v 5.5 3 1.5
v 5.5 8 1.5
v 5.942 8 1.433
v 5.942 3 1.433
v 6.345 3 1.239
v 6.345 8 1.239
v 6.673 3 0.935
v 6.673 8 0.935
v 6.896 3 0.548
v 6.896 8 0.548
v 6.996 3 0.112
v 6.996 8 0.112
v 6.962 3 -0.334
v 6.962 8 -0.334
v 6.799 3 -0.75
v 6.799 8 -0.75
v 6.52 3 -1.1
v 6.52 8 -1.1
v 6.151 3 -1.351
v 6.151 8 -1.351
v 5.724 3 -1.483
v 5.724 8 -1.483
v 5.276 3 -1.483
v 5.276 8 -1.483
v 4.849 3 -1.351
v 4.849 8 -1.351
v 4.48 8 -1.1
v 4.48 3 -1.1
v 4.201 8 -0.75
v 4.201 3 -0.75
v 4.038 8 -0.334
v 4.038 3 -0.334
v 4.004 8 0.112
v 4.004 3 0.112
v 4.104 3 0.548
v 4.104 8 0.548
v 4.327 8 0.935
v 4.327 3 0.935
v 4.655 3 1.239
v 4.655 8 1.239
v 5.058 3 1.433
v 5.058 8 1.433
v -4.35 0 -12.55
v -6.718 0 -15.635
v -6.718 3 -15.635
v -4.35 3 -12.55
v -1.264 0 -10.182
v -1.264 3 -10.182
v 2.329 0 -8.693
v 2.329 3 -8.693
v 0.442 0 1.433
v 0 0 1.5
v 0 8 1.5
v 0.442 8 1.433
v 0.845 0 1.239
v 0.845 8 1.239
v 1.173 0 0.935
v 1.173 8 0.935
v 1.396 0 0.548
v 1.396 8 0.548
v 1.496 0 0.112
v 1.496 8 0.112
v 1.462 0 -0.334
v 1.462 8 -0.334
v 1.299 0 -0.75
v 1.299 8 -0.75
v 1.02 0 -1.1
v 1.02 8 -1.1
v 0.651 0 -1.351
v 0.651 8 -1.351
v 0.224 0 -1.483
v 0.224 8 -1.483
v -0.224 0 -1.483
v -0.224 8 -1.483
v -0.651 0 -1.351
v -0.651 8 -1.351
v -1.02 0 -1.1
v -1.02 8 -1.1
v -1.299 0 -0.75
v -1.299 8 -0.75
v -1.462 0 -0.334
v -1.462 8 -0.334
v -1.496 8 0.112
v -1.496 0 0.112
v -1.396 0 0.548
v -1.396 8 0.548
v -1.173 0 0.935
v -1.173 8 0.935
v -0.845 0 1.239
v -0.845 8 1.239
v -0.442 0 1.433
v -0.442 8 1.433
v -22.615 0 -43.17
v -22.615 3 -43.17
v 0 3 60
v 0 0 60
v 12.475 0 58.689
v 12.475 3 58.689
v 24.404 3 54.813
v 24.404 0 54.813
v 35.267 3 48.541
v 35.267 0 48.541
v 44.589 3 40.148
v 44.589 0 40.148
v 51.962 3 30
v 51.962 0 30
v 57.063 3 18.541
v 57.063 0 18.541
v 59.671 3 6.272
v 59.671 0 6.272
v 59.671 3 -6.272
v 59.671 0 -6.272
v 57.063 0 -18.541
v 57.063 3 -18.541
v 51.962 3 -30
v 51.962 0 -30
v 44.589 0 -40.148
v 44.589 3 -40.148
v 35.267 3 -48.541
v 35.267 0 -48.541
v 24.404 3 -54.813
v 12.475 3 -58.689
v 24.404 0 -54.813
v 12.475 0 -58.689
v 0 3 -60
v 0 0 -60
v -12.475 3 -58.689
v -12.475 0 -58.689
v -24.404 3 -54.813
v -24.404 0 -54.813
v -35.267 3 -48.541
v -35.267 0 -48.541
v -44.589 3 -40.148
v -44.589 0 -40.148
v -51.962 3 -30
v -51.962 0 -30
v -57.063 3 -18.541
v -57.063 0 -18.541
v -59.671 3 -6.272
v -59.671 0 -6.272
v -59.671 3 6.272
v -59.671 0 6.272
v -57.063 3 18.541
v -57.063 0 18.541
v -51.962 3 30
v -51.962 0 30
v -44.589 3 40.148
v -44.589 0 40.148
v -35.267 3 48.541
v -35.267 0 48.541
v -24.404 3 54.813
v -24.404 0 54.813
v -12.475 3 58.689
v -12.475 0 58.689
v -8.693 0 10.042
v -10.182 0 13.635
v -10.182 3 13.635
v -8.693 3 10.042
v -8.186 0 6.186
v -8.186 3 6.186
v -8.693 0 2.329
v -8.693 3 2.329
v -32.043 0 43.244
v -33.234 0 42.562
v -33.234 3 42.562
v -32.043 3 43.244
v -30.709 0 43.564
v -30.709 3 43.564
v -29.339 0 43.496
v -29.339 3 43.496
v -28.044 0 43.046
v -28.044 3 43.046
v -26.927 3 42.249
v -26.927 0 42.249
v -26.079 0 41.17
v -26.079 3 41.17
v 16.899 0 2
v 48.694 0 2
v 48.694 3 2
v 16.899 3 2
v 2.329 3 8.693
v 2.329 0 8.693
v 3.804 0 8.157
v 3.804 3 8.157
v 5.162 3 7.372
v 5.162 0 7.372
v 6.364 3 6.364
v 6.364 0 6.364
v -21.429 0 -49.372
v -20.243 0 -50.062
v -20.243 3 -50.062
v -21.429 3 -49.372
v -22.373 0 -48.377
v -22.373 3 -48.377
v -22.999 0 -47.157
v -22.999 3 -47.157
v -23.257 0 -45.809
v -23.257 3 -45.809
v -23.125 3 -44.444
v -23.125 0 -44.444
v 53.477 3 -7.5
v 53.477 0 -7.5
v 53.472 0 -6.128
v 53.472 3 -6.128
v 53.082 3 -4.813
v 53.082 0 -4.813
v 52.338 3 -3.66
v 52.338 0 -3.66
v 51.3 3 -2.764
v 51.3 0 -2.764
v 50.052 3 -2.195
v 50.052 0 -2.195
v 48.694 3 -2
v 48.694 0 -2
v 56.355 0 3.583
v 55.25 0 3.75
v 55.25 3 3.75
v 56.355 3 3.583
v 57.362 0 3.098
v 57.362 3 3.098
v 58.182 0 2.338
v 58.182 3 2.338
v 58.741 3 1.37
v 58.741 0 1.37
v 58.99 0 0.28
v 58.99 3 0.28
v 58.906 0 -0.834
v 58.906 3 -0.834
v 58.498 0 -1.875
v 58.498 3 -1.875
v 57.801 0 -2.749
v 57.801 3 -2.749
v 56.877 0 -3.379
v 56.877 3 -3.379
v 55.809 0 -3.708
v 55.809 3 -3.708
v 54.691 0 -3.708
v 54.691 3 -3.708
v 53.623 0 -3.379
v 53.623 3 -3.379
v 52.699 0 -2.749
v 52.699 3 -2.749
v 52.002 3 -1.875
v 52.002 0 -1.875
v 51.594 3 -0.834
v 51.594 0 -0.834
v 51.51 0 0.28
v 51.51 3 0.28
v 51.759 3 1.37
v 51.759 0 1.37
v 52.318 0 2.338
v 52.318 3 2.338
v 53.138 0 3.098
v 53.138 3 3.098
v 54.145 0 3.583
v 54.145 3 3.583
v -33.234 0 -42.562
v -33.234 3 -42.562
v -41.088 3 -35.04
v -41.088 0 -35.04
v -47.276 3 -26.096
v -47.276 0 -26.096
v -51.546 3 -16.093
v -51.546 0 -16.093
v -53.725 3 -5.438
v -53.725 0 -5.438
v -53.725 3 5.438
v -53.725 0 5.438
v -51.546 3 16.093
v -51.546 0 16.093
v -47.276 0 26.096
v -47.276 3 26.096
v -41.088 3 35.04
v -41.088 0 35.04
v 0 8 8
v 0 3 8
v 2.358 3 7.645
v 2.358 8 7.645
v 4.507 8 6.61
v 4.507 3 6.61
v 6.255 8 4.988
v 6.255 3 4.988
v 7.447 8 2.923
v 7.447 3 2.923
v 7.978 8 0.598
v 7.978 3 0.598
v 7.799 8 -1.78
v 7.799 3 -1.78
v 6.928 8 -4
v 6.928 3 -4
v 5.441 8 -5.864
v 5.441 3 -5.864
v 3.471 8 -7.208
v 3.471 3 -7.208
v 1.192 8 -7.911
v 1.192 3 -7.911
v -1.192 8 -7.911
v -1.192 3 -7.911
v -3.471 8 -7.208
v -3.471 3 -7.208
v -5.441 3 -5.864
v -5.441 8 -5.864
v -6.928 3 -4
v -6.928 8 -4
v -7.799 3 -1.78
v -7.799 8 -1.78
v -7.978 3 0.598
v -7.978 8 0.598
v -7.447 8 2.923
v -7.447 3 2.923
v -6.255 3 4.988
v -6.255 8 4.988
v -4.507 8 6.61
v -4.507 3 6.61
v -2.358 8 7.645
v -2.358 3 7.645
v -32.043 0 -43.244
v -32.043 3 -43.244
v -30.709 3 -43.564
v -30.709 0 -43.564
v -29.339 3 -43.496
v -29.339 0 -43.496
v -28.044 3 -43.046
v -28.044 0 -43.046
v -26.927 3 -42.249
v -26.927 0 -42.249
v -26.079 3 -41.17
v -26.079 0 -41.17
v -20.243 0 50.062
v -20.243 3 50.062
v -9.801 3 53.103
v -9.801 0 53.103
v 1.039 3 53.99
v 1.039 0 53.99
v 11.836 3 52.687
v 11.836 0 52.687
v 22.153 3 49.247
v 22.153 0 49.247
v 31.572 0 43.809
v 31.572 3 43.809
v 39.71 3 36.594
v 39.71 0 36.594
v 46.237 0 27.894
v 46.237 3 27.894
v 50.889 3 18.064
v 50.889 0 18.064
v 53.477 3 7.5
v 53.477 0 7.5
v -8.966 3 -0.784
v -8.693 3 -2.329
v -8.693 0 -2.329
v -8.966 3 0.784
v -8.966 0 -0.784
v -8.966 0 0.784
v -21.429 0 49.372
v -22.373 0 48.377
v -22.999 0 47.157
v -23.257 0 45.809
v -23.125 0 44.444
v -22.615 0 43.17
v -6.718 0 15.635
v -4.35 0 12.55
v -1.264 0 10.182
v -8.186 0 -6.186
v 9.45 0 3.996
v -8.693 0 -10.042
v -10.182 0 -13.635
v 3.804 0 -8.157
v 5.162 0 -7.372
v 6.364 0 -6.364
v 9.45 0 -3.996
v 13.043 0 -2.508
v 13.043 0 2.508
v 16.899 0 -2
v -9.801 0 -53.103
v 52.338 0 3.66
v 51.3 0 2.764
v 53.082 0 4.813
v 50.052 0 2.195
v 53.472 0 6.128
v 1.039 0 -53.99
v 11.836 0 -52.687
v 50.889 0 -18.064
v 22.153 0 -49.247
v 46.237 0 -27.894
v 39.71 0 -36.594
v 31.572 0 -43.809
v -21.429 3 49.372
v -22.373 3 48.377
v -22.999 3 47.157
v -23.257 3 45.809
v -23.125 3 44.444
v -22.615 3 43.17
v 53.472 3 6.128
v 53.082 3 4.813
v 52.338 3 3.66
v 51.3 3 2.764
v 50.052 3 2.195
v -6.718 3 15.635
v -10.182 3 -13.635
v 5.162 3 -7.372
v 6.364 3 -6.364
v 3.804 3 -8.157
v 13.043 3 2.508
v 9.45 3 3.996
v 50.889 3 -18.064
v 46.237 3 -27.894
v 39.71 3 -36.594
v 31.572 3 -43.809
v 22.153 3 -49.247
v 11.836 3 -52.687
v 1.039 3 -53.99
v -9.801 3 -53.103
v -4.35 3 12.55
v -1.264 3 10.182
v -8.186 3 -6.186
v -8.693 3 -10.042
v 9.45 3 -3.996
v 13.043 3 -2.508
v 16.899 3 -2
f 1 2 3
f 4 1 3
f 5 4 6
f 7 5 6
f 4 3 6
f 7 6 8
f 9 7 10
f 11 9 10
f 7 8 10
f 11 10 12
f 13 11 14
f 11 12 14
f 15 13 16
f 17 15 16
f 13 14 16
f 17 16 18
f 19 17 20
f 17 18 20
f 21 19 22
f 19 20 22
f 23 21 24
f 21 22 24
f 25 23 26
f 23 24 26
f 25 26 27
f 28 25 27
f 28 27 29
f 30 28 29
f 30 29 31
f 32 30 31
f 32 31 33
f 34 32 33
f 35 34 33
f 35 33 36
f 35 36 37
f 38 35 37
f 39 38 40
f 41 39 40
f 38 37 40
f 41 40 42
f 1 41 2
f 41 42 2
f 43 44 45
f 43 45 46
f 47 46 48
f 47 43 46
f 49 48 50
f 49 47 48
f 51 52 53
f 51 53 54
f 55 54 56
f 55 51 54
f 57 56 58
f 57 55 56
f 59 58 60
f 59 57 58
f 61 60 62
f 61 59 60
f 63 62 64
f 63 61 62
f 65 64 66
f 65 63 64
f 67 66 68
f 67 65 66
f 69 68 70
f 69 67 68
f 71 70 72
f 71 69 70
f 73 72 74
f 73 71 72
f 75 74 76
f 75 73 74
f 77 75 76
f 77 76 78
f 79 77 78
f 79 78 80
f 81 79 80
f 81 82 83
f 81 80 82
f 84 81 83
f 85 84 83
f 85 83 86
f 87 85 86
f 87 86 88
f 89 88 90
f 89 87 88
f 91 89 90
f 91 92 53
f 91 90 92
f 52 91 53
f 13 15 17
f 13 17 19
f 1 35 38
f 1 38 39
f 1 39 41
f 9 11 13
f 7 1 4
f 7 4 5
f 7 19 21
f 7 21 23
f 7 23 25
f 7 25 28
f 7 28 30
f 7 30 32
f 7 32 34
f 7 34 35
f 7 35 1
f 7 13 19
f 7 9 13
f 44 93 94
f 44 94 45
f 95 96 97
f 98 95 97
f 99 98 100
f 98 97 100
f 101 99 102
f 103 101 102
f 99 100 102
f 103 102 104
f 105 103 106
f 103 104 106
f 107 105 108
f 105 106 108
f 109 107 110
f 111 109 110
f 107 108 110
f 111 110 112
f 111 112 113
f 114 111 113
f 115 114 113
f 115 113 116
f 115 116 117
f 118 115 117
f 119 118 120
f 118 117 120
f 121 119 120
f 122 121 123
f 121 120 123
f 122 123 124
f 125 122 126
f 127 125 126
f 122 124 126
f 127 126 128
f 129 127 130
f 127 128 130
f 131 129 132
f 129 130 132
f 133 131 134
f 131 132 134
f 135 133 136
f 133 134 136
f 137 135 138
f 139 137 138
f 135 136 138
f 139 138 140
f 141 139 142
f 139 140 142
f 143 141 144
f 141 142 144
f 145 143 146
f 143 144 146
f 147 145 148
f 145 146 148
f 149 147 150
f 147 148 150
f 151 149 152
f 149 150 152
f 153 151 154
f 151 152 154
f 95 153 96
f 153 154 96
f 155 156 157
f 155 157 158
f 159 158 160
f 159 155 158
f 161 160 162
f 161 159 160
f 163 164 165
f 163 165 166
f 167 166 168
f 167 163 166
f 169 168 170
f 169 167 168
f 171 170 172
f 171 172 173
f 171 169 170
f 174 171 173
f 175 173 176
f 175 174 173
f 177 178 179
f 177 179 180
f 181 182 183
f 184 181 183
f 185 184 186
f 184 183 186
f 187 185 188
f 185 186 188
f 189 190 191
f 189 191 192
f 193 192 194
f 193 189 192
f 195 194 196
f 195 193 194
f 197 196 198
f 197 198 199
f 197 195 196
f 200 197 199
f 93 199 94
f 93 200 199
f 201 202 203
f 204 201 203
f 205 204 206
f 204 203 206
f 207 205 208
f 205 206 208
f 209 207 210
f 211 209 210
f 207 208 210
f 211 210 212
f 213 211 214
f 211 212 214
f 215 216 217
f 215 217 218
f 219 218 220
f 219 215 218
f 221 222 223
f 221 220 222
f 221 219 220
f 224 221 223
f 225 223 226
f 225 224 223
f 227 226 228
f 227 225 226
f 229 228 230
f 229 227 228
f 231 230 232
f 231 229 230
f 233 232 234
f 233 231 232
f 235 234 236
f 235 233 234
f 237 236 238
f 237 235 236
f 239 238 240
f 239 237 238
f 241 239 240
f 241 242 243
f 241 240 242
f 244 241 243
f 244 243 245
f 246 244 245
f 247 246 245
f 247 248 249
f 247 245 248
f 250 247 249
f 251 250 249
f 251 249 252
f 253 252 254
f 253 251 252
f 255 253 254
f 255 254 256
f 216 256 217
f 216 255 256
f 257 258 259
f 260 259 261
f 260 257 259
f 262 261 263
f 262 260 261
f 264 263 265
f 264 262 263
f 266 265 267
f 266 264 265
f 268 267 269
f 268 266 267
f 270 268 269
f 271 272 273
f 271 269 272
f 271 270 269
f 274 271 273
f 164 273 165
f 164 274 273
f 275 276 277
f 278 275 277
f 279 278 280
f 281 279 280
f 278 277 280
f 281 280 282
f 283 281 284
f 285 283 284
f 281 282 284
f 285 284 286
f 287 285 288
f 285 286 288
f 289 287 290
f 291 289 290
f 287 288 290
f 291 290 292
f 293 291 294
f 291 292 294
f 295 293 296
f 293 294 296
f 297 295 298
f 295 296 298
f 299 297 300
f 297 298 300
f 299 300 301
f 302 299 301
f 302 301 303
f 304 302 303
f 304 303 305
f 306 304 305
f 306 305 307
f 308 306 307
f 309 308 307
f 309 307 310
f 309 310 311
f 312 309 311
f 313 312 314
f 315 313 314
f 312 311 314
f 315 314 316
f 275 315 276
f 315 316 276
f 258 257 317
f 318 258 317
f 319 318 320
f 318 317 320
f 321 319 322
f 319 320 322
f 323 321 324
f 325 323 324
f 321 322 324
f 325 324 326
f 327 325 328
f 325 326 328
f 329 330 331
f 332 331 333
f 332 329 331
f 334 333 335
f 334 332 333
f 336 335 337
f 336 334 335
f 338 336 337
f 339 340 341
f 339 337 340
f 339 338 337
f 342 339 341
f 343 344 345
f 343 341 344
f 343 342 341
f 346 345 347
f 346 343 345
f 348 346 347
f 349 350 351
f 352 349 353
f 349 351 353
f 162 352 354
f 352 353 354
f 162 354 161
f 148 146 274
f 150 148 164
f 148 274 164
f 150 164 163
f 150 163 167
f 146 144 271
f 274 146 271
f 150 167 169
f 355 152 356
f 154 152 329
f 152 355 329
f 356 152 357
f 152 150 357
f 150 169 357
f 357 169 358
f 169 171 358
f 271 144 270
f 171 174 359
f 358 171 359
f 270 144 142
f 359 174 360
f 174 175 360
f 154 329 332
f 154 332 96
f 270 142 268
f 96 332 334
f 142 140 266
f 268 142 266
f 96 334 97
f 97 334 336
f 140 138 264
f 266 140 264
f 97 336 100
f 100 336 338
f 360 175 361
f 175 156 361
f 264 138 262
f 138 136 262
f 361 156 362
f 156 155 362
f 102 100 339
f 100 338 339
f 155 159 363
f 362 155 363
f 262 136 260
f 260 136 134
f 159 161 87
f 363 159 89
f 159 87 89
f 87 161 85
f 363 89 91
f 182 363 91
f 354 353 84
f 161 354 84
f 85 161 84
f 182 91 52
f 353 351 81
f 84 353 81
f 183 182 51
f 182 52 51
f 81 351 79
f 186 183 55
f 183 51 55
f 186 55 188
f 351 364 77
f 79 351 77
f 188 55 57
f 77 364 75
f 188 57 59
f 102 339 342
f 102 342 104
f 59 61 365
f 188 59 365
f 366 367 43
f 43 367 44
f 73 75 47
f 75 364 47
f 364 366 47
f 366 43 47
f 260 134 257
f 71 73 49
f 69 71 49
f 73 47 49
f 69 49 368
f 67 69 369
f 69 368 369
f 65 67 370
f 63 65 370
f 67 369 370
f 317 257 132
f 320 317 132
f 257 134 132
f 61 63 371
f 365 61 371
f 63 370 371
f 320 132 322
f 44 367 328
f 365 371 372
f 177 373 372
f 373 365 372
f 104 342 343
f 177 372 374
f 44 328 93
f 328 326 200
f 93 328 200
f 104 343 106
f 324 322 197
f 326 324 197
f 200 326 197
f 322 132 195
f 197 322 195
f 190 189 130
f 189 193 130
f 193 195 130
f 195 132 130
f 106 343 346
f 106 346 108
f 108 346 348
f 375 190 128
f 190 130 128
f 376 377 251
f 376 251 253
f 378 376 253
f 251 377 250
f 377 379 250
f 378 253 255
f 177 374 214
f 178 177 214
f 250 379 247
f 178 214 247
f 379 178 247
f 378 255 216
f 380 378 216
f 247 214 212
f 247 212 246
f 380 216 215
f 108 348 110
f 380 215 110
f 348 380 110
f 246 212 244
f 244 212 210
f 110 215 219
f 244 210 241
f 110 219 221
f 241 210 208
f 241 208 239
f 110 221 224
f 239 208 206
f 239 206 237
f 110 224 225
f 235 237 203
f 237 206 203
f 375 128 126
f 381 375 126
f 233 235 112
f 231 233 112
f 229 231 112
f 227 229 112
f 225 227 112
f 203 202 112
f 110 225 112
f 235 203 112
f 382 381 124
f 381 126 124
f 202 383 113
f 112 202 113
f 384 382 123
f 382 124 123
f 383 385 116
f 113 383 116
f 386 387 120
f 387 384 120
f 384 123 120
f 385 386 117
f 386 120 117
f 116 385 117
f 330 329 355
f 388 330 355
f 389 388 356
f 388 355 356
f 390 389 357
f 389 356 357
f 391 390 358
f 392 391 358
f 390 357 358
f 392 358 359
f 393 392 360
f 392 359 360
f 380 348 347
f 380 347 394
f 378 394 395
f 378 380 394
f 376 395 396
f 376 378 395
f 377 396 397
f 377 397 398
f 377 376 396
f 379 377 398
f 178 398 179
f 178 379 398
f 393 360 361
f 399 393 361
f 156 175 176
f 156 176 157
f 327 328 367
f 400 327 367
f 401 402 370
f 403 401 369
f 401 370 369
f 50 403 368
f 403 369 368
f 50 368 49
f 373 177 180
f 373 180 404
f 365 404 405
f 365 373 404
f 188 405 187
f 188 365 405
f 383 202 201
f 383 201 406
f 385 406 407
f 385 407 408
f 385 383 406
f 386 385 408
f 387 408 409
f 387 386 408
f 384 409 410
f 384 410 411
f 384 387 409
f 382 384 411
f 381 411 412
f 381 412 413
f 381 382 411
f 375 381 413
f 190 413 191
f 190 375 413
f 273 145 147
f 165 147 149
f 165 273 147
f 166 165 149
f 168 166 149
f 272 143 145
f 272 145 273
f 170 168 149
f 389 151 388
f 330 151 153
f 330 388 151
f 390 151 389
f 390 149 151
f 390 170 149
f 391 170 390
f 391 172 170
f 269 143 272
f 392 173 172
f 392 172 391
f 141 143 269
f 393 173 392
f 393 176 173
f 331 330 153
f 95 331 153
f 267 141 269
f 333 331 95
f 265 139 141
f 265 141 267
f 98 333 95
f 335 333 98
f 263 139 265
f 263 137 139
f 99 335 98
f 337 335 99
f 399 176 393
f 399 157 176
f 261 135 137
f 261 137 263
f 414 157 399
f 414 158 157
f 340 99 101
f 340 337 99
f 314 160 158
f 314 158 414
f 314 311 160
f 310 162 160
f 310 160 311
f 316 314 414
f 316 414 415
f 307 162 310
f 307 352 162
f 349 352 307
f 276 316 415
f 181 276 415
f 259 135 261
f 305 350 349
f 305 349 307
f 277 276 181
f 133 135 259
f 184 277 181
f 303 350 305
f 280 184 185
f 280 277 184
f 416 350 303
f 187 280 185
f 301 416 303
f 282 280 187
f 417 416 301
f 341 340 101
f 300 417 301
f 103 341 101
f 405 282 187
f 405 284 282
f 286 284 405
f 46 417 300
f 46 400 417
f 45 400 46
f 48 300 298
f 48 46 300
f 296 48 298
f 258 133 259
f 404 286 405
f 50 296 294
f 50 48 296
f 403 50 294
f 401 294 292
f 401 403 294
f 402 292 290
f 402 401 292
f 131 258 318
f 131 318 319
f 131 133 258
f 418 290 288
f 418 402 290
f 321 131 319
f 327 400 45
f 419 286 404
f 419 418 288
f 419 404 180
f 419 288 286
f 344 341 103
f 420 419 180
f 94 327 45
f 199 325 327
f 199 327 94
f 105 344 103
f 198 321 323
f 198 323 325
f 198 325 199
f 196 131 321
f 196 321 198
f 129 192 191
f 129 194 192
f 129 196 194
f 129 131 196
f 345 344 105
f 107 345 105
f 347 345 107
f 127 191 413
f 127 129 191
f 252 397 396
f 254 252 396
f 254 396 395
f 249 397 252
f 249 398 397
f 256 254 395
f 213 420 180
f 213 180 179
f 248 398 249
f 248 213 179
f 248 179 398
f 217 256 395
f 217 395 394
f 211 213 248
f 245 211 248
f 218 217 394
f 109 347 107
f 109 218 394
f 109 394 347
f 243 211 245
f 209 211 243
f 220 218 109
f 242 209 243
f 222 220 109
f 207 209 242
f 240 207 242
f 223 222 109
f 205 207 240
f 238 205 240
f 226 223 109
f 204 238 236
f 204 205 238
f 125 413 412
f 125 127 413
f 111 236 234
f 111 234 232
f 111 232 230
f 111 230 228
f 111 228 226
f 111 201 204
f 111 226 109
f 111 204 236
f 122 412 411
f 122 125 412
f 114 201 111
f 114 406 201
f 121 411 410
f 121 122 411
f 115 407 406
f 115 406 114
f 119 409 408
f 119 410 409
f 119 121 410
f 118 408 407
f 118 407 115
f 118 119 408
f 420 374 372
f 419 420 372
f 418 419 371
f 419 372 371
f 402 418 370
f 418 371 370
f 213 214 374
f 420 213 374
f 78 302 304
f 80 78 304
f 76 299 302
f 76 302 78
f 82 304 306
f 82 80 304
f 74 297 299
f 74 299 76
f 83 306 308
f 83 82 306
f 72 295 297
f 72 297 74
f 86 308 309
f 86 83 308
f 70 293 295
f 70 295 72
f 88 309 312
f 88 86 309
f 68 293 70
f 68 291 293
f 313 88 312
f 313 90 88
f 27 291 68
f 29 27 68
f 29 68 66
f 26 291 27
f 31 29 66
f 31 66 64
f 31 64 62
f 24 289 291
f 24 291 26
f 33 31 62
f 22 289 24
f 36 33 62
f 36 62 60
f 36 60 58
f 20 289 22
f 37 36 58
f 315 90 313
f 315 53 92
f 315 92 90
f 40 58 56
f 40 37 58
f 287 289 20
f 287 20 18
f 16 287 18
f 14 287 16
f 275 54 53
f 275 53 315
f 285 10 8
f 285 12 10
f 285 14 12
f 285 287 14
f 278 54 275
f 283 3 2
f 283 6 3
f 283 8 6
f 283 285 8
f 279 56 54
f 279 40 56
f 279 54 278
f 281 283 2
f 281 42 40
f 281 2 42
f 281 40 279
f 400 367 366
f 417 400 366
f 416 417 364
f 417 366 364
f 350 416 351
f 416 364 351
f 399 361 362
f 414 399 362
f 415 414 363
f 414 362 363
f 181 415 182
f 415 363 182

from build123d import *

# Parameters (mm, degrees)
SKETCH1_R               = 60
SKETCH1_R_2             = 54
BOSS_EXTRUDE1_DEPTH     = 3
SKETCH2_R               = 9
BOSS_EXTRUDE2_DEPTH     = 3
SKETCH3_R               = 8
BOSS_EXTRUDE3_DEPTH     = 5
BOSS_EXTRUDE4_DEPTH     = 3
CIRPATTERN9_COUNT       = 3
MIRROR2_COPY_1_DEPTH    = 3
MIRROR2_COPY_2_DEPTH    = 3
SKETCH5_R               = 1.5
CUT_EXTRUDE1_DEPTH      = 5
CUT_EXTRUDE2_DEPTH      = 86.229103011
CUT_EXTRUDE2_DEPTH_BACK = 86.229103011
SKETCH6_R               = 1.5
CUT_EXTRUDE3_DEPTH      = 86
CUT_EXTRUDE3_DEPTH_BACK = 86
SKETCH7_R               = 3.75


with BuildPart() as part:
    # Sketch1 → Boss-Extrude1 (new body)
    with BuildSketch(Plane(origin=(0, 0, 0), x_dir=(1, 0, 0), z_dir=(0, 1, 0))):
        with Locations(Location((0, 0, 0), (0, 0, 270))):
            Circle(SKETCH1_R)
        with Locations(Location((0, 0, 0), (0, 0, 270))):
            Circle(SKETCH1_R_2, mode=Mode.SUBTRACT)
    extrude(amount=BOSS_EXTRUDE1_DEPTH)



with BuildPart() as body_2:
    # Sketch2 → Boss-Extrude2 (new body)
    with BuildSketch(Plane(origin=(0, 0, 0), x_dir=(1, 0, 0), z_dir=(0, 1, 0))):
        with Locations(Location((0, 0, 0), (0, 0, 270))):
            Circle(SKETCH2_R)
    extrude(amount=BOSS_EXTRUDE2_DEPTH)

    # Sketch3 → Boss-Extrude3 (add)
    with BuildSketch(Plane(origin=(0, 3, 0), x_dir=(1, 0, 0), z_dir=(0, 1, 0))):
        with Locations(Location((0, 0, 0), (0, 0, 270))):
            Circle(SKETCH3_R)
    extrude(amount=BOSS_EXTRUDE3_DEPTH)


with BuildPart() as part_1:
    add(part.part)

    add(body_2.part)  # Boss-Extrude4 merges body 2
    # Sketch4 → Boss-Extrude4 (add)
    with BuildSketch(Plane(origin=(0, 0, 0), x_dir=(1, 0, 0), z_dir=(0, 1, 0))):
        with BuildLine():
            Line((9, 0), (54, 0))
            ThreePointArc((54, 0), (53.868998701, -3.759119436), (53.47663041, -7.5))
            ThreePointArc((53.47663041, -7.5), (52.338407888, -3.660460246), (48.694167528, -2))
            Line((48.694167528, -2), (16.899494937, -2))
            ThreePointArc((16.899494937, -2), (11.197705074, -3.13415652), (6.363961031, -6.363961031))
            ThreePointArc((6.363961031, -6.363961031), (8.314915793, -3.444150891), (9, 0))
        make_face()
    boss_extrude4 = extrude(amount=BOSS_EXTRUDE4_DEPTH)

    # CirPattern9: Boss-Extrude4 ×3 about axis
    cirpattern9_axis = Axis((0, 0, 0), (0, 1, 0))
    for i in range(1, CIRPATTERN9_COUNT):
        add(boss_extrude4.rotate(cirpattern9_axis, i * 360 / CIRPATTERN9_COUNT))

    # Mirror2: Boss-Extrude4 across plane
    add(boss_extrude4.mirror(Plane(origin=(-4.5, 54.446930959, -7.794228634), x_dir=(0.5000000000000041, 0, 0.8660254037844362), z_dir=(0.8660254037844364, 0, -0.5000000000000041))))

    # Mirror2 copy 1 sketch → Mirror2 copy 1 (add)
    with BuildSketch(Plane(origin=(0, 0, 0), x_dir=(-0.5000000000000082, 0, -0.8660254037844338), z_dir=(0, 1, 0))):
        with BuildLine():
            Line((9, 0), (54, 0))
            ThreePointArc((54, 0), (53.868998701, 3.759119436), (53.47663041, 7.5))
            ThreePointArc((53.47663041, 7.5), (52.338407888, 3.660460246), (48.694167528, 2))
            Line((48.694167528, 2), (16.899494937, 2))
            ThreePointArc((16.899494937, 2), (11.197705074, 3.13415652), (6.363961031, 6.363961031))
            ThreePointArc((6.363961031, 6.363961031), (8.314915793, 3.444150891), (9, 0))
        make_face()
    extrude(amount=MIRROR2_COPY_1_DEPTH)

    # Mirror2 copy 2 sketch → Mirror2 copy 2 (add)
    with BuildSketch(Plane(origin=(0, 0, 0), x_dir=(1, 0, 0), z_dir=(0, 1, 0))):
        with BuildLine():
            Line((9, 0), (54, 0))
            ThreePointArc((54, 0), (53.868998701, 3.759119436), (53.47663041, 7.5))
            ThreePointArc((53.47663041, 7.5), (52.338407888, 3.660460246), (48.694167528, 2))
            Line((48.694167528, 2), (16.899494937, 2))
            ThreePointArc((16.899494937, 2), (11.197705074, 3.13415652), (6.363961031, 6.363961031))
            ThreePointArc((6.363961031, 6.363961031), (8.314915793, 3.444150891), (9, 0))
        make_face()
    extrude(amount=MIRROR2_COPY_2_DEPTH)

    # Sketch5 → Cut-Extrude1 (cut)
    with BuildSketch(Plane(origin=(0, 8, 0), x_dir=(1, 0, 0), z_dir=(0, 1, 0))):
        with Locations(Location((5.5, 0, 0), (0, 0, 270))):
            Circle(SKETCH5_R)
    extrude(amount=-CUT_EXTRUDE1_DEPTH, mode=Mode.SUBTRACT)

    # Sketch6 → Cut-Extrude2 (cut, two sides: drawn at the far end of the back side and taken through both)
    with BuildSketch(Plane(origin=(0, 8, 0), x_dir=(1, 0, 0), z_dir=(0, 1, 0)).offset(-CUT_EXTRUDE2_DEPTH_BACK)):
        with Locations(Location((0, 0, 0), (0, 0, 270))):
            Circle(SKETCH6_R)
    extrude(amount=CUT_EXTRUDE2_DEPTH + CUT_EXTRUDE2_DEPTH_BACK, mode=Mode.SUBTRACT)

    # Sketch7 → Cut-Extrude3 (cut, two sides: drawn at the far end of the back side and taken through both)
    with BuildSketch(Plane(origin=(0, 3, 0), x_dir=(1, 0, 0), z_dir=(0, 1, 0)).offset(-CUT_EXTRUDE3_DEPTH_BACK)):
        with Locations(Location((55.25, 0, 0), (0, 0, 270))):
            Circle(SKETCH7_R)
    extrude(amount=CUT_EXTRUDE3_DEPTH + CUT_EXTRUDE3_DEPTH_BACK, mode=Mode.SUBTRACT)


solid = part_1.part
